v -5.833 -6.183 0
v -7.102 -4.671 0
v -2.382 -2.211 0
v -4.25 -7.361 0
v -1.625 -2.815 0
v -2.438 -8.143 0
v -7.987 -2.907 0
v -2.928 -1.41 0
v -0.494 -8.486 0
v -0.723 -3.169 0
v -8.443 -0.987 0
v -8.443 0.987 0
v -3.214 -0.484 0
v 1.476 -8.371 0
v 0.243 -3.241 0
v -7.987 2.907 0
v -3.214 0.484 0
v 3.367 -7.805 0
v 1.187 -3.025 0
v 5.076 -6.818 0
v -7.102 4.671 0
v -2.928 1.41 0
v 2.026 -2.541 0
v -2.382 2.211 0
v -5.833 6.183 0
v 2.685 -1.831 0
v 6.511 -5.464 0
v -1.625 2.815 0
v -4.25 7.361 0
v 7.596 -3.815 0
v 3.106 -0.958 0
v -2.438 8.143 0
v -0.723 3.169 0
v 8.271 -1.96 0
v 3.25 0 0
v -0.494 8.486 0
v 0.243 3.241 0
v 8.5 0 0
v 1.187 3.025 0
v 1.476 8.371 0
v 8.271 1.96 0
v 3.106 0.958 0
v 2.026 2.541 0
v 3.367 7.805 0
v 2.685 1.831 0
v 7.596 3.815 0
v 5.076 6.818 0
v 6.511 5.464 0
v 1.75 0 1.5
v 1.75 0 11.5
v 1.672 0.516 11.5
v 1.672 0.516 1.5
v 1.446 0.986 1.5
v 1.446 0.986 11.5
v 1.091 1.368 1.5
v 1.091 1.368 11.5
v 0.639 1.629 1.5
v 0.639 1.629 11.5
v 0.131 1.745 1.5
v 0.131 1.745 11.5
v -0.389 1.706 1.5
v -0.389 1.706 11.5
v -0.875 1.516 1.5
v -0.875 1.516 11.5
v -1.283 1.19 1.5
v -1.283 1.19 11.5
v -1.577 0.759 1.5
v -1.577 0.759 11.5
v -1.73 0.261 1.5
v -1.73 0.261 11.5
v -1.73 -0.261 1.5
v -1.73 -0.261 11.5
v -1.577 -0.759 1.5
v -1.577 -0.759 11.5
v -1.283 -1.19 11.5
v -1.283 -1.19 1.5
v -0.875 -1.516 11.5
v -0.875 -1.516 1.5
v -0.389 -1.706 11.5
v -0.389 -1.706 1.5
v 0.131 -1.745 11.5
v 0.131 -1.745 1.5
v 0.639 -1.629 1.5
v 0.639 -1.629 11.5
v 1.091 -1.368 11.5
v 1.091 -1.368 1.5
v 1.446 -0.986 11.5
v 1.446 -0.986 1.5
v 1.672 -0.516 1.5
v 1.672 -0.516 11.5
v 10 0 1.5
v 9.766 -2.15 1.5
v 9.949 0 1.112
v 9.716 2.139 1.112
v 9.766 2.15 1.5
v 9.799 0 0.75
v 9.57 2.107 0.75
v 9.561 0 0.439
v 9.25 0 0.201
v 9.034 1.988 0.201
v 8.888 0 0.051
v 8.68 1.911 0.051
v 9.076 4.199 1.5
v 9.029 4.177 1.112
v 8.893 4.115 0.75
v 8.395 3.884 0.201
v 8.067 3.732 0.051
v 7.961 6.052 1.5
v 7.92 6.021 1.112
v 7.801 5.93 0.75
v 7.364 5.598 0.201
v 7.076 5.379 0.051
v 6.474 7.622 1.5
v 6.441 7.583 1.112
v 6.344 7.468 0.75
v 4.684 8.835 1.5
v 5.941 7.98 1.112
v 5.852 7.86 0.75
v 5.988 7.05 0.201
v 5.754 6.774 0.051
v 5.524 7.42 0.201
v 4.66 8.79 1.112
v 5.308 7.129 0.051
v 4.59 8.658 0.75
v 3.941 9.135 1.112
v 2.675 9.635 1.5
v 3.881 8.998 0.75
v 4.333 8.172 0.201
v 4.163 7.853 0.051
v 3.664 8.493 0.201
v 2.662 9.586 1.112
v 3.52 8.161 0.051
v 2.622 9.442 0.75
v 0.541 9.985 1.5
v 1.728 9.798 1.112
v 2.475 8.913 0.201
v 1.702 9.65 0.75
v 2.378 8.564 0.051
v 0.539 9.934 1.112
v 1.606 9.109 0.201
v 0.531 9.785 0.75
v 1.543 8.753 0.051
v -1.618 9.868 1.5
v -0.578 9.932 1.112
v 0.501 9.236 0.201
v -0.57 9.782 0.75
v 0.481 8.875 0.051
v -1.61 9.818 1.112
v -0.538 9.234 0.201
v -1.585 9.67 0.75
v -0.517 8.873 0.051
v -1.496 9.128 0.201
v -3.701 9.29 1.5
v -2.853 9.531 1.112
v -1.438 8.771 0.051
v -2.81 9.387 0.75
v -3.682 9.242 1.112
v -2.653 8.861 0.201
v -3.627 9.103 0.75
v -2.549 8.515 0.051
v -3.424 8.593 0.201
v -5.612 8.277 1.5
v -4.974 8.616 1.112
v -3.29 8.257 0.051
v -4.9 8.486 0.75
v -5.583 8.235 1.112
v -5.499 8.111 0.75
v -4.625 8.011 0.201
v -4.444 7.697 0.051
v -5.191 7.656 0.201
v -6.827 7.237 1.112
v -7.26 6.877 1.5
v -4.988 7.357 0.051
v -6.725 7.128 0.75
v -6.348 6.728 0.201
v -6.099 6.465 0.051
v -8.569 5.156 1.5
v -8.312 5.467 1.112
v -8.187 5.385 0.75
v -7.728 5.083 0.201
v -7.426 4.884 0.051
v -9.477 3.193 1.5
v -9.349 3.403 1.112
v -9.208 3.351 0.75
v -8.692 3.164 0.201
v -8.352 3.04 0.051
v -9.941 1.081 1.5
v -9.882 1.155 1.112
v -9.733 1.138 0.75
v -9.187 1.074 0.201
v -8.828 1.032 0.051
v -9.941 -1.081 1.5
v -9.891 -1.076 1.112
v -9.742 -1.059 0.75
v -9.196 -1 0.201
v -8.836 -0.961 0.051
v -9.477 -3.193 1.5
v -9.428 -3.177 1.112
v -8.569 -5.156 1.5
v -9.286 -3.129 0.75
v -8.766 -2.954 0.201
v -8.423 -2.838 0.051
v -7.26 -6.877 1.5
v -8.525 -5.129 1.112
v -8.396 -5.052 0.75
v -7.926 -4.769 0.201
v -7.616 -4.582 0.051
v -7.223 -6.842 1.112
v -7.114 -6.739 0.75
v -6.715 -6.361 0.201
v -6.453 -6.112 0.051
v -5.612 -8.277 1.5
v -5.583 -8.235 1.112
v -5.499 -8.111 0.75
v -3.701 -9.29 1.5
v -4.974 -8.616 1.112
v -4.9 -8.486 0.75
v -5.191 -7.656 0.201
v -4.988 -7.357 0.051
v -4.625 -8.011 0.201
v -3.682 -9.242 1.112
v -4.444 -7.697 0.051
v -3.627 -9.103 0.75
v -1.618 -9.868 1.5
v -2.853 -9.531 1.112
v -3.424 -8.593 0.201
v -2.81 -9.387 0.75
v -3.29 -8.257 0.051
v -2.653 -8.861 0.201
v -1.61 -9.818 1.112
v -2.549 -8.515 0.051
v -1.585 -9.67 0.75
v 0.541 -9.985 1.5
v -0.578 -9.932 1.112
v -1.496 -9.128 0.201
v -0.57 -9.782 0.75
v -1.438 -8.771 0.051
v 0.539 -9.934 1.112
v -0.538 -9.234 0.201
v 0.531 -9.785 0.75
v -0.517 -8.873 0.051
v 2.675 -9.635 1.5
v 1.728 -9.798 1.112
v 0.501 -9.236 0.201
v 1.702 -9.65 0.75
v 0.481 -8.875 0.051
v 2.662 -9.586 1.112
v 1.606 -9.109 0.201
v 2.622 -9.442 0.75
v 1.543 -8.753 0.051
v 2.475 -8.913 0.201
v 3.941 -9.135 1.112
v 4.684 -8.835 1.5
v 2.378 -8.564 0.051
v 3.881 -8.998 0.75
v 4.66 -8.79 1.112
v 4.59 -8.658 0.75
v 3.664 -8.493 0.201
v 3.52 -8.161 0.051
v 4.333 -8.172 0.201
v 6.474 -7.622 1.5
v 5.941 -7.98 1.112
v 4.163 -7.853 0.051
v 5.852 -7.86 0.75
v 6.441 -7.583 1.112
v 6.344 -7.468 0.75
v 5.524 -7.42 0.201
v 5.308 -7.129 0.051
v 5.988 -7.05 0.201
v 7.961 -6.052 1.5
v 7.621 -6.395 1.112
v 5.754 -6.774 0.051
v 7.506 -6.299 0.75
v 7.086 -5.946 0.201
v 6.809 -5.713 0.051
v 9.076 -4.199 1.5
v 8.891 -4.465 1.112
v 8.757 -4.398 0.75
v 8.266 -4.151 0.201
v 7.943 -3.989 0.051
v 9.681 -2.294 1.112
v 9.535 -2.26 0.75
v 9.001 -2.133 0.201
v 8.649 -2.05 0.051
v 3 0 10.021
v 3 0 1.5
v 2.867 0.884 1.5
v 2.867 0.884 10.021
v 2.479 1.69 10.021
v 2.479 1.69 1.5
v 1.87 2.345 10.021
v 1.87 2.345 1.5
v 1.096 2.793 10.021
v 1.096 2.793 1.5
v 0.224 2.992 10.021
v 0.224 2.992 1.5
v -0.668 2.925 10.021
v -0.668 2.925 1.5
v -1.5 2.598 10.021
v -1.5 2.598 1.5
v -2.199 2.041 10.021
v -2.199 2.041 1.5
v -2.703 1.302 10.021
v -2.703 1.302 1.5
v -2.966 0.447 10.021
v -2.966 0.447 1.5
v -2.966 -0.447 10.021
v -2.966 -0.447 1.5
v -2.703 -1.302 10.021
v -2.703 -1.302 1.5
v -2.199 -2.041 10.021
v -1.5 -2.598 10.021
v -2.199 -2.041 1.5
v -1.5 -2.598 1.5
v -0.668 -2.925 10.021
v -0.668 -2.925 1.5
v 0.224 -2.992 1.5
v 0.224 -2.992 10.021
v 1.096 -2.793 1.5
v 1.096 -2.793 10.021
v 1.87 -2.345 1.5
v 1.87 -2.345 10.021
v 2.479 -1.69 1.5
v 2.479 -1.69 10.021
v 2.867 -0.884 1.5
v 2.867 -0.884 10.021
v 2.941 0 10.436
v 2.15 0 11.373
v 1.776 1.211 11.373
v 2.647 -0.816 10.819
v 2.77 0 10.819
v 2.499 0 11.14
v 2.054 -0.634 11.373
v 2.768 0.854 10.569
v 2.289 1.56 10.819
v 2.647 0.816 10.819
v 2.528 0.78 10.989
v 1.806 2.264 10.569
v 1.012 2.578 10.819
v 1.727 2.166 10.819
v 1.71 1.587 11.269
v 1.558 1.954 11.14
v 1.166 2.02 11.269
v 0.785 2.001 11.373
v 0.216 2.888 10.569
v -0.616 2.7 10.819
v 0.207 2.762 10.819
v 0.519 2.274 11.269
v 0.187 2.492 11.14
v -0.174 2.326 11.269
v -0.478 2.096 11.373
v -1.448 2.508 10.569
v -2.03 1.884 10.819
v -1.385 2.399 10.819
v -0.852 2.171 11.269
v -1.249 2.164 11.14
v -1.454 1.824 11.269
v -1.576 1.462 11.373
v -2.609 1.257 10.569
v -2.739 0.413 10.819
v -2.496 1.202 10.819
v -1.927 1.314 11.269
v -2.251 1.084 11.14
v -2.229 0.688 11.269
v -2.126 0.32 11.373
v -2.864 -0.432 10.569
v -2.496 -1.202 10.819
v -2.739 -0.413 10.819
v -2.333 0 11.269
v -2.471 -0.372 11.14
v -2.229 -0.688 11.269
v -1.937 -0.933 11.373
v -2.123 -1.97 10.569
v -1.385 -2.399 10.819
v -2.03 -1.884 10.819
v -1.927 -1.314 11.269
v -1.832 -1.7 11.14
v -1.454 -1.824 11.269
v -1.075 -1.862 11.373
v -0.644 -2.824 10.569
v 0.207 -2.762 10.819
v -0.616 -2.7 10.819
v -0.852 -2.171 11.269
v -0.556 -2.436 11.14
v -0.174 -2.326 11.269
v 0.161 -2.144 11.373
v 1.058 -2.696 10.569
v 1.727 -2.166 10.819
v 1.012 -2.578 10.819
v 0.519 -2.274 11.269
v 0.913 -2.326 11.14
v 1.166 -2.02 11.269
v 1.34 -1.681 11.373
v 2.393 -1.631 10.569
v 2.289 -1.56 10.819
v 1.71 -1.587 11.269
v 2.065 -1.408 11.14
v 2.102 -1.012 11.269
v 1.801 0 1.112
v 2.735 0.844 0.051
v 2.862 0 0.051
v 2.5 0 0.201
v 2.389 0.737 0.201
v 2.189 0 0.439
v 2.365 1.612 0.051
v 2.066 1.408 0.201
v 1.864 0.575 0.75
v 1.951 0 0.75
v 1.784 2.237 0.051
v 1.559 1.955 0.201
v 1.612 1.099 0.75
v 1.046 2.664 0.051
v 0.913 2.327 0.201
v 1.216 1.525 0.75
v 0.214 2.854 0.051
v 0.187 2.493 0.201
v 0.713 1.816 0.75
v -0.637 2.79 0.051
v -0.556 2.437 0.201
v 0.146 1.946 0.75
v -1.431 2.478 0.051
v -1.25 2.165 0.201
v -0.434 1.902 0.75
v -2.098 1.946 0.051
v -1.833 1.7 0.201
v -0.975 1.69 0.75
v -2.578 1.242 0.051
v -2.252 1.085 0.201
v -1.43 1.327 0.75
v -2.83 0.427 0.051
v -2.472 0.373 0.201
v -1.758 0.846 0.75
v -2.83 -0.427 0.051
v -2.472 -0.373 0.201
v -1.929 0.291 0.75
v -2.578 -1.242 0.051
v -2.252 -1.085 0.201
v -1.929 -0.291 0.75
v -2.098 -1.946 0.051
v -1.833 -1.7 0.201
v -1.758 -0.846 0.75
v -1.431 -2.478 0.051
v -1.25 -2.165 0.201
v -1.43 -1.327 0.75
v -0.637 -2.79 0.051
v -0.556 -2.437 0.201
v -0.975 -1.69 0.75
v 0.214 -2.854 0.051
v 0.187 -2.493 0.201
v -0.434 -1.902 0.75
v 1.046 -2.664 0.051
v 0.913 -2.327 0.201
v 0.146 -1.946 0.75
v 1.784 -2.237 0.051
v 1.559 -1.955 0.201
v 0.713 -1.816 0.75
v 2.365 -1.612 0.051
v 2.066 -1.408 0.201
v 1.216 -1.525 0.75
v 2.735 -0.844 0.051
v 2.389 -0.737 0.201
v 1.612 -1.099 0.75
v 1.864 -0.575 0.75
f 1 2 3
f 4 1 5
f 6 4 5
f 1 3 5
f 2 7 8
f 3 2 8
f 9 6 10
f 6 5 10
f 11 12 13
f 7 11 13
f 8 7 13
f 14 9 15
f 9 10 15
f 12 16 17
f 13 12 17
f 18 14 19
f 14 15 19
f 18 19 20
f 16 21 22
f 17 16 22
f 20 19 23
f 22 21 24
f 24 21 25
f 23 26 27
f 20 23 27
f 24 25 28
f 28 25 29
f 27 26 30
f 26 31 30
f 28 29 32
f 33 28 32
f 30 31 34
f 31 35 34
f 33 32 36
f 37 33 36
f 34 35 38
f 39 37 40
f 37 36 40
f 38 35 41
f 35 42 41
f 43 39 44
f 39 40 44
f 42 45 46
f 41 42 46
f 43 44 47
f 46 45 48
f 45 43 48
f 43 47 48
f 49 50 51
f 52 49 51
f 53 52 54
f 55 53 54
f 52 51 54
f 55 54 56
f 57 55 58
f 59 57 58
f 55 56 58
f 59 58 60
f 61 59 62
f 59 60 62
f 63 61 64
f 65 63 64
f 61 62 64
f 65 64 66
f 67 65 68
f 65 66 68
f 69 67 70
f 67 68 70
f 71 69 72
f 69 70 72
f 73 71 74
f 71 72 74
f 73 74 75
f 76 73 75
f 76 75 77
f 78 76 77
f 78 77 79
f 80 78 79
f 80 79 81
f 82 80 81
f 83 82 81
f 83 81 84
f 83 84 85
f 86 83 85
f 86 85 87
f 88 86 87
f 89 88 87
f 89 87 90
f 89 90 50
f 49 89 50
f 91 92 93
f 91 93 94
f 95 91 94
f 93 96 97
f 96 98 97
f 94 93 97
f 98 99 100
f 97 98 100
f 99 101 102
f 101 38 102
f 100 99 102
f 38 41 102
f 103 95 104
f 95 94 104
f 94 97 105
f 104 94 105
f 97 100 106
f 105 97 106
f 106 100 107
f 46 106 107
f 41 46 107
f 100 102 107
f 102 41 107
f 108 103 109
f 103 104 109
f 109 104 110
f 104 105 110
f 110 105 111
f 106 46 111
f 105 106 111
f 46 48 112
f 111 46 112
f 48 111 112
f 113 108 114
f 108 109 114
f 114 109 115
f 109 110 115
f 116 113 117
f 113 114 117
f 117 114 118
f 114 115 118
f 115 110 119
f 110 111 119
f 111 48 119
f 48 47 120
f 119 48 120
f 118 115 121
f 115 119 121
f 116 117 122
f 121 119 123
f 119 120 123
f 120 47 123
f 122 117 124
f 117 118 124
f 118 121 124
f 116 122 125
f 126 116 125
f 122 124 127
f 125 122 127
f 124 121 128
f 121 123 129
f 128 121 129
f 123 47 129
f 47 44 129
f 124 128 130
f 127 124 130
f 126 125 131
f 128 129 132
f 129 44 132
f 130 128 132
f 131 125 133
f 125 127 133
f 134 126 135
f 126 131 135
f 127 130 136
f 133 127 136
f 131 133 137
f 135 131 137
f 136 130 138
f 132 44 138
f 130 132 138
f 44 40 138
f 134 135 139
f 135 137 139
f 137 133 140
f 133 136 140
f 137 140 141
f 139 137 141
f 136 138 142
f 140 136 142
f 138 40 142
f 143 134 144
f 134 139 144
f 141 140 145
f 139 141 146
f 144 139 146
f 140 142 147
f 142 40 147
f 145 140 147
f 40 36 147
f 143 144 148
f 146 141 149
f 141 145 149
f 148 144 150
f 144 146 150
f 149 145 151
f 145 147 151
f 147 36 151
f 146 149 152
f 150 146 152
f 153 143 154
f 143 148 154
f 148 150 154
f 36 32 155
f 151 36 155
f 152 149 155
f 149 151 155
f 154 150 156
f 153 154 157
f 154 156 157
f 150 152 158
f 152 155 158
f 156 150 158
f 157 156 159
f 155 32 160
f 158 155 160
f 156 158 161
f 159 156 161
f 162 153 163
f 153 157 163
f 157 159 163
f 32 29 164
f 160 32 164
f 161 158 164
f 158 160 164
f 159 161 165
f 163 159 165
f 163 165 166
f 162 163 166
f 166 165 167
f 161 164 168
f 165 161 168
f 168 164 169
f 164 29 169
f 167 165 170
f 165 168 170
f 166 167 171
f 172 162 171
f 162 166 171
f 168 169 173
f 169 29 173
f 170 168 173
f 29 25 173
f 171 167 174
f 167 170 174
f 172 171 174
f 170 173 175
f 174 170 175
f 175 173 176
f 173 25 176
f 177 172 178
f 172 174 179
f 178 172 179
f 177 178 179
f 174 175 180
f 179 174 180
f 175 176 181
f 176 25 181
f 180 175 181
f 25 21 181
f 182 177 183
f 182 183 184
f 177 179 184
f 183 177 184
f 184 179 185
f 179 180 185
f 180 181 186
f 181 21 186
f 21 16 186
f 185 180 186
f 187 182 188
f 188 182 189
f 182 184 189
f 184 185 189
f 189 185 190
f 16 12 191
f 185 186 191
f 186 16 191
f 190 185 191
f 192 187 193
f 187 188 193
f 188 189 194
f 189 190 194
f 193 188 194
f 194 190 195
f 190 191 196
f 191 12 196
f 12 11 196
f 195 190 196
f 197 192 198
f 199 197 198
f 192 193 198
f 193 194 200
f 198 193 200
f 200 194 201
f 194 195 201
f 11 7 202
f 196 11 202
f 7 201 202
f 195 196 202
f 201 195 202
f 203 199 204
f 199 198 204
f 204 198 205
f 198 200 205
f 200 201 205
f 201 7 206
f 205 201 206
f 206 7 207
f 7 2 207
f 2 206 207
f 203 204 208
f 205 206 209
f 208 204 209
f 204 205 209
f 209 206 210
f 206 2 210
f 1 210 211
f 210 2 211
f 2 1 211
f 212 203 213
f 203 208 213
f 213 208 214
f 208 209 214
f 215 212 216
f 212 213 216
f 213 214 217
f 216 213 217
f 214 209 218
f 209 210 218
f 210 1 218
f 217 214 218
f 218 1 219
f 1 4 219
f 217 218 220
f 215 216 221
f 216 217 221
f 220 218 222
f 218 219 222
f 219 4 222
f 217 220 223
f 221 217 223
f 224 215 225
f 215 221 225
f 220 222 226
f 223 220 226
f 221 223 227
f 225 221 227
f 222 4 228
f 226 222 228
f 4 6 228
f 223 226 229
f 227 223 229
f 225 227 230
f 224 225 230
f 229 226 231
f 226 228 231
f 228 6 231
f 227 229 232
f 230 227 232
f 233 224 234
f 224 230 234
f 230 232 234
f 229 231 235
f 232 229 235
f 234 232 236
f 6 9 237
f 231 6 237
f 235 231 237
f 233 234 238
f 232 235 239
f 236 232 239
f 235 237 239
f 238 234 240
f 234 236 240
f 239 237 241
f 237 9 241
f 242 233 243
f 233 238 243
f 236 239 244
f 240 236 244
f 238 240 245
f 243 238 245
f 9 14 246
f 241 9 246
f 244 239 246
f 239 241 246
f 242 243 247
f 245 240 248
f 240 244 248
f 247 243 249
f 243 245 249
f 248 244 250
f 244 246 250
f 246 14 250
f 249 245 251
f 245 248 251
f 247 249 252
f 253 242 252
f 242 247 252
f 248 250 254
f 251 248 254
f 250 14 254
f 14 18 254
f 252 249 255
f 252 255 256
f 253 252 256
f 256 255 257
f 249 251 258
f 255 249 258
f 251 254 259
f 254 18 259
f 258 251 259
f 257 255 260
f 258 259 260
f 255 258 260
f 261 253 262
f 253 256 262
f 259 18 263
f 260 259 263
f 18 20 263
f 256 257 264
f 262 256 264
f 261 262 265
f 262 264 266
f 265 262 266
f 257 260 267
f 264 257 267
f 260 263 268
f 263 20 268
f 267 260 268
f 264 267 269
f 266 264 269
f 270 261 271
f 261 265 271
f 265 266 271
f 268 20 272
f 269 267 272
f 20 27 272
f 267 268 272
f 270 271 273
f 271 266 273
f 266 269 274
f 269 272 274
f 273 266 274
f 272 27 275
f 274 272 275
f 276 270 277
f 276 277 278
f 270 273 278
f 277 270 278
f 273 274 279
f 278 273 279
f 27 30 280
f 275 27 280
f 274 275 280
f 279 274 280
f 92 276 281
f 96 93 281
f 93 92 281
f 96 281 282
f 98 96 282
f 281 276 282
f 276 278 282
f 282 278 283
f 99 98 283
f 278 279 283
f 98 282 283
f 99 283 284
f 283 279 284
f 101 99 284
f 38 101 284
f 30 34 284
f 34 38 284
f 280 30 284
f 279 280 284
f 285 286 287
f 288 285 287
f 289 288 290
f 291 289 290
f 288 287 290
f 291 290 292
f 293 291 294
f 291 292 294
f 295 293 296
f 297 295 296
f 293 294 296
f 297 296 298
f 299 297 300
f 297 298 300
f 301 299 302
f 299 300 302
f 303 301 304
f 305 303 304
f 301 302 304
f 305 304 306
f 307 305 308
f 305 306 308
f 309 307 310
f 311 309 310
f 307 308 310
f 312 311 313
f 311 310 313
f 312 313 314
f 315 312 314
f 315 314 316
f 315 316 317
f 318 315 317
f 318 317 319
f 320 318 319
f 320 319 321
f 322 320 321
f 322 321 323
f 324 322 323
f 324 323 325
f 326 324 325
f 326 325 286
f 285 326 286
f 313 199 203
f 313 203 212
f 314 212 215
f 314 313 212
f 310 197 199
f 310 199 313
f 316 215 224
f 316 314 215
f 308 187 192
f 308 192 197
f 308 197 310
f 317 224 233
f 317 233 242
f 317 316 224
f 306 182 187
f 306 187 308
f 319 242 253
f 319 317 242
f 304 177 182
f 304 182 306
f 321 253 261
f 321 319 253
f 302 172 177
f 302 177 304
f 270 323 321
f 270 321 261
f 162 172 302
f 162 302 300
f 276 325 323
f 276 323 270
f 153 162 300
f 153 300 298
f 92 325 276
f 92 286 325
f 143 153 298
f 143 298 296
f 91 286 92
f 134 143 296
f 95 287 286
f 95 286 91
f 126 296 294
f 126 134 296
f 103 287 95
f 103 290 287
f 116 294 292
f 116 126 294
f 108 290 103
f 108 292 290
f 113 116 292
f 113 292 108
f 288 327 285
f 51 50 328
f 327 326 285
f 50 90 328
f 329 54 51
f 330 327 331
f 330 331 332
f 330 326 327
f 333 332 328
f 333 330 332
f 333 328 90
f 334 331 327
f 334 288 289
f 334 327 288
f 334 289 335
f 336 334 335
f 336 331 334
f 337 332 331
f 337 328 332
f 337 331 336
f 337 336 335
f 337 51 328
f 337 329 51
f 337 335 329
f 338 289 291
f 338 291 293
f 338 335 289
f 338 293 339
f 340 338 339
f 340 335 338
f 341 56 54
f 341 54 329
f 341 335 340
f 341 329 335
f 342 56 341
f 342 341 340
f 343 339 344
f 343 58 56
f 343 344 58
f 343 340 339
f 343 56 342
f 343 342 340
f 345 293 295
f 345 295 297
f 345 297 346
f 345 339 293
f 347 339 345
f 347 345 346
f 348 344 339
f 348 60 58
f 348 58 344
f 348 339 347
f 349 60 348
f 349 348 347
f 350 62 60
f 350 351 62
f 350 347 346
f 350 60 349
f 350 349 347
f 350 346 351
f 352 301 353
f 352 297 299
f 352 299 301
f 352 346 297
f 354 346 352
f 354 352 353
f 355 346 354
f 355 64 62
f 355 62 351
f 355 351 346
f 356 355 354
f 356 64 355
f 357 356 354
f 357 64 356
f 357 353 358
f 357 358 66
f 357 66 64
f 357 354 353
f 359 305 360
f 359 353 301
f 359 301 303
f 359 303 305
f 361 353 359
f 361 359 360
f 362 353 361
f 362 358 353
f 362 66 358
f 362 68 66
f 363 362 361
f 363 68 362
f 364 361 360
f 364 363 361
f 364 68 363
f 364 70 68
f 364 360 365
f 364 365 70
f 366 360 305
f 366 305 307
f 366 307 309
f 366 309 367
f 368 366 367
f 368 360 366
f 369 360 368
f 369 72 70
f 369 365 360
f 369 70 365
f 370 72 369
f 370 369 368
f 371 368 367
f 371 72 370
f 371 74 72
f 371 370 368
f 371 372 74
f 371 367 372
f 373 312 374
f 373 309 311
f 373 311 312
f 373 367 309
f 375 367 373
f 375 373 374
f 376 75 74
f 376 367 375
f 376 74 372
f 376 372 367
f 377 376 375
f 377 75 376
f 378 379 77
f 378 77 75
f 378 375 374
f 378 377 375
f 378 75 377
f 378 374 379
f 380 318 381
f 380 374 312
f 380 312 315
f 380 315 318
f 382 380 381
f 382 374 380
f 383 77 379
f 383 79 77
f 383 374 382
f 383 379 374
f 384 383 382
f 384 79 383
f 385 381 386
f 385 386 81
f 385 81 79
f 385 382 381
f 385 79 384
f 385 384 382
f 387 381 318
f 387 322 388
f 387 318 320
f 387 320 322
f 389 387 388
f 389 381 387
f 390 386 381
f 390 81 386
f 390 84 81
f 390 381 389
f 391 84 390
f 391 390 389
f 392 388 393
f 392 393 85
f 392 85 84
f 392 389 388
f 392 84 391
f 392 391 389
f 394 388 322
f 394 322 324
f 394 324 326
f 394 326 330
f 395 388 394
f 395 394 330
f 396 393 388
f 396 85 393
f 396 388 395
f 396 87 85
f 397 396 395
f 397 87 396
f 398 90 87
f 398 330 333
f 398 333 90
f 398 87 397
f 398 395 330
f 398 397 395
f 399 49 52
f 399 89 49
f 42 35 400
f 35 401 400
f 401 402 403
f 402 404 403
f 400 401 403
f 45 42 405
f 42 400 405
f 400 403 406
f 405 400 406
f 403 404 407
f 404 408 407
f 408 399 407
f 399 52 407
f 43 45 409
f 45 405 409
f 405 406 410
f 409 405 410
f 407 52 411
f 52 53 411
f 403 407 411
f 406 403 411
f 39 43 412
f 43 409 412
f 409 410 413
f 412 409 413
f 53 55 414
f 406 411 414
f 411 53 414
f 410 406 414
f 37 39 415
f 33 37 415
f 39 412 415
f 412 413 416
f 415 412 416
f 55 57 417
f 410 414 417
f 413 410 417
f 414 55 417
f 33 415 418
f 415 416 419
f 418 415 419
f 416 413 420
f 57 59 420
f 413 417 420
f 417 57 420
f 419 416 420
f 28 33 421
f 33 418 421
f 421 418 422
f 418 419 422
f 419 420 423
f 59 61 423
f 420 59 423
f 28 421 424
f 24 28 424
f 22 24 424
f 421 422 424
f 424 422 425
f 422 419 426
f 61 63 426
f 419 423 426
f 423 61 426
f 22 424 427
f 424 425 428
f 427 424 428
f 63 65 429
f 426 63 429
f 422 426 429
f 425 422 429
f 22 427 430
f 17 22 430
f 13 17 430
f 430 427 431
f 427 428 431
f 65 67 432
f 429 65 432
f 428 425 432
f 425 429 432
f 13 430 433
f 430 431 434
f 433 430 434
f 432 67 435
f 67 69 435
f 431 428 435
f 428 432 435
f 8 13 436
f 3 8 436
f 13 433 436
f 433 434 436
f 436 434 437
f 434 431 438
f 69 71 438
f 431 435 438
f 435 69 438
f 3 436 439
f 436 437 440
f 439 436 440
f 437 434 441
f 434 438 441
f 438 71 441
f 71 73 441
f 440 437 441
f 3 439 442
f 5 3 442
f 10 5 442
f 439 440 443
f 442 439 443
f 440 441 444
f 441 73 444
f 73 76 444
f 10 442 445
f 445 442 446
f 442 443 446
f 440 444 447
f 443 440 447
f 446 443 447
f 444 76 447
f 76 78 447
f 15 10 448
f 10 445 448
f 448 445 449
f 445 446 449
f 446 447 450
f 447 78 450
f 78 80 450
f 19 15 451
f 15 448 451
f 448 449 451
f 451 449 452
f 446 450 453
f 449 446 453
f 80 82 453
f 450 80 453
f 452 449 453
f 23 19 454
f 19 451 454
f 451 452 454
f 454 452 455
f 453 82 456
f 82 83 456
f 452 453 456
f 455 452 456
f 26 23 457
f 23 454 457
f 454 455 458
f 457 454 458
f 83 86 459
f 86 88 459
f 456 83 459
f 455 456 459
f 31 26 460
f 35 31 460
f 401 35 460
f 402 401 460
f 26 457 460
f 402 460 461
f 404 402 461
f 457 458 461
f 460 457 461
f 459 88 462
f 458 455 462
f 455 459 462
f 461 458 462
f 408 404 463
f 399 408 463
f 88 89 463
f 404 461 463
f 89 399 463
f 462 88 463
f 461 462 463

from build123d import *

# Parameters (mm, degrees)
F0_R     = 10
F1_DEPTH = 1.5
F2_R     = 3
F3_DEPTH = 10
F4_R     = 1.75
F5_DEPTH = 11.501


# Not quite as in the source:
# - a fillet or chamfer that OpenCascade refuses, or shapes differently, is made with other operations: its cross-section is extruded or revolved along the edge and cut away or added


with BuildPart() as f1:
    # F0 (on Top) → F1 (new body)
    with BuildSketch(Plane.XY):
        Circle(F0_R)
    extrude(amount=F1_DEPTH)

    # F2 (on face) → F3 (join)
    with BuildSketch(Plane.XY.offset(1.5)):
        Circle(F2_R)
    extrude(amount=F3_DEPTH)

    # F4 (on face) → F5 (cut, through all)
    with BuildSketch(Plane.XY.offset(11.5)):
        Circle(F4_R)
    extrude(amount=-F5_DEPTH, mode=Mode.SUBTRACT)

    # F6: fillet of radius 1.5 on 3 edges, made by hand

    # F6_s1 → F6_t2 (revolve, cut)
    with BuildSketch(Plane.XZ):
        with BuildLine():
            ThreePointArc((10, 1.5), (9.5606601718, 0.4393398282), (8.5, 0))
            Line((8.5, 0), (10, 0))
            Line((10, 0), (10, 1.5))
        make_face()
    revolve(axis=Axis((0, 0, 0), (0, 0, 1)), mode=Mode.SUBTRACT)

    # F6_s3 → F6_t4 (revolve, cut)
    with BuildSketch(Plane.XZ):
        with BuildLine():
            ThreePointArc((3.25, 0), (2.1893398282, 0.4393398282), (1.75, 1.5))
            Line((1.75, 1.5), (1.75, 0))
            Line((1.75, 0), (3.25, 0))
        make_face()
    revolve(axis=Axis((0, 0, 0), (0, 0, 1)), mode=Mode.SUBTRACT)

    # F6_s5 → F6_t6 (revolve, cut)
    with BuildSketch(Plane.XZ):
        with BuildLine():
            ThreePointArc((3, 10.0209800542), (2.6456439237, 10.9892258908), (1.75, 11.5))
            Line((1.75, 11.5), (3, 11.5))
            Line((3, 11.5), (3, 10.0209800542))
        make_face()
    revolve(axis=Axis((0, 0, 11.5), (0, 0, 1)), mode=Mode.SUBTRACT)


solid = f1.part
